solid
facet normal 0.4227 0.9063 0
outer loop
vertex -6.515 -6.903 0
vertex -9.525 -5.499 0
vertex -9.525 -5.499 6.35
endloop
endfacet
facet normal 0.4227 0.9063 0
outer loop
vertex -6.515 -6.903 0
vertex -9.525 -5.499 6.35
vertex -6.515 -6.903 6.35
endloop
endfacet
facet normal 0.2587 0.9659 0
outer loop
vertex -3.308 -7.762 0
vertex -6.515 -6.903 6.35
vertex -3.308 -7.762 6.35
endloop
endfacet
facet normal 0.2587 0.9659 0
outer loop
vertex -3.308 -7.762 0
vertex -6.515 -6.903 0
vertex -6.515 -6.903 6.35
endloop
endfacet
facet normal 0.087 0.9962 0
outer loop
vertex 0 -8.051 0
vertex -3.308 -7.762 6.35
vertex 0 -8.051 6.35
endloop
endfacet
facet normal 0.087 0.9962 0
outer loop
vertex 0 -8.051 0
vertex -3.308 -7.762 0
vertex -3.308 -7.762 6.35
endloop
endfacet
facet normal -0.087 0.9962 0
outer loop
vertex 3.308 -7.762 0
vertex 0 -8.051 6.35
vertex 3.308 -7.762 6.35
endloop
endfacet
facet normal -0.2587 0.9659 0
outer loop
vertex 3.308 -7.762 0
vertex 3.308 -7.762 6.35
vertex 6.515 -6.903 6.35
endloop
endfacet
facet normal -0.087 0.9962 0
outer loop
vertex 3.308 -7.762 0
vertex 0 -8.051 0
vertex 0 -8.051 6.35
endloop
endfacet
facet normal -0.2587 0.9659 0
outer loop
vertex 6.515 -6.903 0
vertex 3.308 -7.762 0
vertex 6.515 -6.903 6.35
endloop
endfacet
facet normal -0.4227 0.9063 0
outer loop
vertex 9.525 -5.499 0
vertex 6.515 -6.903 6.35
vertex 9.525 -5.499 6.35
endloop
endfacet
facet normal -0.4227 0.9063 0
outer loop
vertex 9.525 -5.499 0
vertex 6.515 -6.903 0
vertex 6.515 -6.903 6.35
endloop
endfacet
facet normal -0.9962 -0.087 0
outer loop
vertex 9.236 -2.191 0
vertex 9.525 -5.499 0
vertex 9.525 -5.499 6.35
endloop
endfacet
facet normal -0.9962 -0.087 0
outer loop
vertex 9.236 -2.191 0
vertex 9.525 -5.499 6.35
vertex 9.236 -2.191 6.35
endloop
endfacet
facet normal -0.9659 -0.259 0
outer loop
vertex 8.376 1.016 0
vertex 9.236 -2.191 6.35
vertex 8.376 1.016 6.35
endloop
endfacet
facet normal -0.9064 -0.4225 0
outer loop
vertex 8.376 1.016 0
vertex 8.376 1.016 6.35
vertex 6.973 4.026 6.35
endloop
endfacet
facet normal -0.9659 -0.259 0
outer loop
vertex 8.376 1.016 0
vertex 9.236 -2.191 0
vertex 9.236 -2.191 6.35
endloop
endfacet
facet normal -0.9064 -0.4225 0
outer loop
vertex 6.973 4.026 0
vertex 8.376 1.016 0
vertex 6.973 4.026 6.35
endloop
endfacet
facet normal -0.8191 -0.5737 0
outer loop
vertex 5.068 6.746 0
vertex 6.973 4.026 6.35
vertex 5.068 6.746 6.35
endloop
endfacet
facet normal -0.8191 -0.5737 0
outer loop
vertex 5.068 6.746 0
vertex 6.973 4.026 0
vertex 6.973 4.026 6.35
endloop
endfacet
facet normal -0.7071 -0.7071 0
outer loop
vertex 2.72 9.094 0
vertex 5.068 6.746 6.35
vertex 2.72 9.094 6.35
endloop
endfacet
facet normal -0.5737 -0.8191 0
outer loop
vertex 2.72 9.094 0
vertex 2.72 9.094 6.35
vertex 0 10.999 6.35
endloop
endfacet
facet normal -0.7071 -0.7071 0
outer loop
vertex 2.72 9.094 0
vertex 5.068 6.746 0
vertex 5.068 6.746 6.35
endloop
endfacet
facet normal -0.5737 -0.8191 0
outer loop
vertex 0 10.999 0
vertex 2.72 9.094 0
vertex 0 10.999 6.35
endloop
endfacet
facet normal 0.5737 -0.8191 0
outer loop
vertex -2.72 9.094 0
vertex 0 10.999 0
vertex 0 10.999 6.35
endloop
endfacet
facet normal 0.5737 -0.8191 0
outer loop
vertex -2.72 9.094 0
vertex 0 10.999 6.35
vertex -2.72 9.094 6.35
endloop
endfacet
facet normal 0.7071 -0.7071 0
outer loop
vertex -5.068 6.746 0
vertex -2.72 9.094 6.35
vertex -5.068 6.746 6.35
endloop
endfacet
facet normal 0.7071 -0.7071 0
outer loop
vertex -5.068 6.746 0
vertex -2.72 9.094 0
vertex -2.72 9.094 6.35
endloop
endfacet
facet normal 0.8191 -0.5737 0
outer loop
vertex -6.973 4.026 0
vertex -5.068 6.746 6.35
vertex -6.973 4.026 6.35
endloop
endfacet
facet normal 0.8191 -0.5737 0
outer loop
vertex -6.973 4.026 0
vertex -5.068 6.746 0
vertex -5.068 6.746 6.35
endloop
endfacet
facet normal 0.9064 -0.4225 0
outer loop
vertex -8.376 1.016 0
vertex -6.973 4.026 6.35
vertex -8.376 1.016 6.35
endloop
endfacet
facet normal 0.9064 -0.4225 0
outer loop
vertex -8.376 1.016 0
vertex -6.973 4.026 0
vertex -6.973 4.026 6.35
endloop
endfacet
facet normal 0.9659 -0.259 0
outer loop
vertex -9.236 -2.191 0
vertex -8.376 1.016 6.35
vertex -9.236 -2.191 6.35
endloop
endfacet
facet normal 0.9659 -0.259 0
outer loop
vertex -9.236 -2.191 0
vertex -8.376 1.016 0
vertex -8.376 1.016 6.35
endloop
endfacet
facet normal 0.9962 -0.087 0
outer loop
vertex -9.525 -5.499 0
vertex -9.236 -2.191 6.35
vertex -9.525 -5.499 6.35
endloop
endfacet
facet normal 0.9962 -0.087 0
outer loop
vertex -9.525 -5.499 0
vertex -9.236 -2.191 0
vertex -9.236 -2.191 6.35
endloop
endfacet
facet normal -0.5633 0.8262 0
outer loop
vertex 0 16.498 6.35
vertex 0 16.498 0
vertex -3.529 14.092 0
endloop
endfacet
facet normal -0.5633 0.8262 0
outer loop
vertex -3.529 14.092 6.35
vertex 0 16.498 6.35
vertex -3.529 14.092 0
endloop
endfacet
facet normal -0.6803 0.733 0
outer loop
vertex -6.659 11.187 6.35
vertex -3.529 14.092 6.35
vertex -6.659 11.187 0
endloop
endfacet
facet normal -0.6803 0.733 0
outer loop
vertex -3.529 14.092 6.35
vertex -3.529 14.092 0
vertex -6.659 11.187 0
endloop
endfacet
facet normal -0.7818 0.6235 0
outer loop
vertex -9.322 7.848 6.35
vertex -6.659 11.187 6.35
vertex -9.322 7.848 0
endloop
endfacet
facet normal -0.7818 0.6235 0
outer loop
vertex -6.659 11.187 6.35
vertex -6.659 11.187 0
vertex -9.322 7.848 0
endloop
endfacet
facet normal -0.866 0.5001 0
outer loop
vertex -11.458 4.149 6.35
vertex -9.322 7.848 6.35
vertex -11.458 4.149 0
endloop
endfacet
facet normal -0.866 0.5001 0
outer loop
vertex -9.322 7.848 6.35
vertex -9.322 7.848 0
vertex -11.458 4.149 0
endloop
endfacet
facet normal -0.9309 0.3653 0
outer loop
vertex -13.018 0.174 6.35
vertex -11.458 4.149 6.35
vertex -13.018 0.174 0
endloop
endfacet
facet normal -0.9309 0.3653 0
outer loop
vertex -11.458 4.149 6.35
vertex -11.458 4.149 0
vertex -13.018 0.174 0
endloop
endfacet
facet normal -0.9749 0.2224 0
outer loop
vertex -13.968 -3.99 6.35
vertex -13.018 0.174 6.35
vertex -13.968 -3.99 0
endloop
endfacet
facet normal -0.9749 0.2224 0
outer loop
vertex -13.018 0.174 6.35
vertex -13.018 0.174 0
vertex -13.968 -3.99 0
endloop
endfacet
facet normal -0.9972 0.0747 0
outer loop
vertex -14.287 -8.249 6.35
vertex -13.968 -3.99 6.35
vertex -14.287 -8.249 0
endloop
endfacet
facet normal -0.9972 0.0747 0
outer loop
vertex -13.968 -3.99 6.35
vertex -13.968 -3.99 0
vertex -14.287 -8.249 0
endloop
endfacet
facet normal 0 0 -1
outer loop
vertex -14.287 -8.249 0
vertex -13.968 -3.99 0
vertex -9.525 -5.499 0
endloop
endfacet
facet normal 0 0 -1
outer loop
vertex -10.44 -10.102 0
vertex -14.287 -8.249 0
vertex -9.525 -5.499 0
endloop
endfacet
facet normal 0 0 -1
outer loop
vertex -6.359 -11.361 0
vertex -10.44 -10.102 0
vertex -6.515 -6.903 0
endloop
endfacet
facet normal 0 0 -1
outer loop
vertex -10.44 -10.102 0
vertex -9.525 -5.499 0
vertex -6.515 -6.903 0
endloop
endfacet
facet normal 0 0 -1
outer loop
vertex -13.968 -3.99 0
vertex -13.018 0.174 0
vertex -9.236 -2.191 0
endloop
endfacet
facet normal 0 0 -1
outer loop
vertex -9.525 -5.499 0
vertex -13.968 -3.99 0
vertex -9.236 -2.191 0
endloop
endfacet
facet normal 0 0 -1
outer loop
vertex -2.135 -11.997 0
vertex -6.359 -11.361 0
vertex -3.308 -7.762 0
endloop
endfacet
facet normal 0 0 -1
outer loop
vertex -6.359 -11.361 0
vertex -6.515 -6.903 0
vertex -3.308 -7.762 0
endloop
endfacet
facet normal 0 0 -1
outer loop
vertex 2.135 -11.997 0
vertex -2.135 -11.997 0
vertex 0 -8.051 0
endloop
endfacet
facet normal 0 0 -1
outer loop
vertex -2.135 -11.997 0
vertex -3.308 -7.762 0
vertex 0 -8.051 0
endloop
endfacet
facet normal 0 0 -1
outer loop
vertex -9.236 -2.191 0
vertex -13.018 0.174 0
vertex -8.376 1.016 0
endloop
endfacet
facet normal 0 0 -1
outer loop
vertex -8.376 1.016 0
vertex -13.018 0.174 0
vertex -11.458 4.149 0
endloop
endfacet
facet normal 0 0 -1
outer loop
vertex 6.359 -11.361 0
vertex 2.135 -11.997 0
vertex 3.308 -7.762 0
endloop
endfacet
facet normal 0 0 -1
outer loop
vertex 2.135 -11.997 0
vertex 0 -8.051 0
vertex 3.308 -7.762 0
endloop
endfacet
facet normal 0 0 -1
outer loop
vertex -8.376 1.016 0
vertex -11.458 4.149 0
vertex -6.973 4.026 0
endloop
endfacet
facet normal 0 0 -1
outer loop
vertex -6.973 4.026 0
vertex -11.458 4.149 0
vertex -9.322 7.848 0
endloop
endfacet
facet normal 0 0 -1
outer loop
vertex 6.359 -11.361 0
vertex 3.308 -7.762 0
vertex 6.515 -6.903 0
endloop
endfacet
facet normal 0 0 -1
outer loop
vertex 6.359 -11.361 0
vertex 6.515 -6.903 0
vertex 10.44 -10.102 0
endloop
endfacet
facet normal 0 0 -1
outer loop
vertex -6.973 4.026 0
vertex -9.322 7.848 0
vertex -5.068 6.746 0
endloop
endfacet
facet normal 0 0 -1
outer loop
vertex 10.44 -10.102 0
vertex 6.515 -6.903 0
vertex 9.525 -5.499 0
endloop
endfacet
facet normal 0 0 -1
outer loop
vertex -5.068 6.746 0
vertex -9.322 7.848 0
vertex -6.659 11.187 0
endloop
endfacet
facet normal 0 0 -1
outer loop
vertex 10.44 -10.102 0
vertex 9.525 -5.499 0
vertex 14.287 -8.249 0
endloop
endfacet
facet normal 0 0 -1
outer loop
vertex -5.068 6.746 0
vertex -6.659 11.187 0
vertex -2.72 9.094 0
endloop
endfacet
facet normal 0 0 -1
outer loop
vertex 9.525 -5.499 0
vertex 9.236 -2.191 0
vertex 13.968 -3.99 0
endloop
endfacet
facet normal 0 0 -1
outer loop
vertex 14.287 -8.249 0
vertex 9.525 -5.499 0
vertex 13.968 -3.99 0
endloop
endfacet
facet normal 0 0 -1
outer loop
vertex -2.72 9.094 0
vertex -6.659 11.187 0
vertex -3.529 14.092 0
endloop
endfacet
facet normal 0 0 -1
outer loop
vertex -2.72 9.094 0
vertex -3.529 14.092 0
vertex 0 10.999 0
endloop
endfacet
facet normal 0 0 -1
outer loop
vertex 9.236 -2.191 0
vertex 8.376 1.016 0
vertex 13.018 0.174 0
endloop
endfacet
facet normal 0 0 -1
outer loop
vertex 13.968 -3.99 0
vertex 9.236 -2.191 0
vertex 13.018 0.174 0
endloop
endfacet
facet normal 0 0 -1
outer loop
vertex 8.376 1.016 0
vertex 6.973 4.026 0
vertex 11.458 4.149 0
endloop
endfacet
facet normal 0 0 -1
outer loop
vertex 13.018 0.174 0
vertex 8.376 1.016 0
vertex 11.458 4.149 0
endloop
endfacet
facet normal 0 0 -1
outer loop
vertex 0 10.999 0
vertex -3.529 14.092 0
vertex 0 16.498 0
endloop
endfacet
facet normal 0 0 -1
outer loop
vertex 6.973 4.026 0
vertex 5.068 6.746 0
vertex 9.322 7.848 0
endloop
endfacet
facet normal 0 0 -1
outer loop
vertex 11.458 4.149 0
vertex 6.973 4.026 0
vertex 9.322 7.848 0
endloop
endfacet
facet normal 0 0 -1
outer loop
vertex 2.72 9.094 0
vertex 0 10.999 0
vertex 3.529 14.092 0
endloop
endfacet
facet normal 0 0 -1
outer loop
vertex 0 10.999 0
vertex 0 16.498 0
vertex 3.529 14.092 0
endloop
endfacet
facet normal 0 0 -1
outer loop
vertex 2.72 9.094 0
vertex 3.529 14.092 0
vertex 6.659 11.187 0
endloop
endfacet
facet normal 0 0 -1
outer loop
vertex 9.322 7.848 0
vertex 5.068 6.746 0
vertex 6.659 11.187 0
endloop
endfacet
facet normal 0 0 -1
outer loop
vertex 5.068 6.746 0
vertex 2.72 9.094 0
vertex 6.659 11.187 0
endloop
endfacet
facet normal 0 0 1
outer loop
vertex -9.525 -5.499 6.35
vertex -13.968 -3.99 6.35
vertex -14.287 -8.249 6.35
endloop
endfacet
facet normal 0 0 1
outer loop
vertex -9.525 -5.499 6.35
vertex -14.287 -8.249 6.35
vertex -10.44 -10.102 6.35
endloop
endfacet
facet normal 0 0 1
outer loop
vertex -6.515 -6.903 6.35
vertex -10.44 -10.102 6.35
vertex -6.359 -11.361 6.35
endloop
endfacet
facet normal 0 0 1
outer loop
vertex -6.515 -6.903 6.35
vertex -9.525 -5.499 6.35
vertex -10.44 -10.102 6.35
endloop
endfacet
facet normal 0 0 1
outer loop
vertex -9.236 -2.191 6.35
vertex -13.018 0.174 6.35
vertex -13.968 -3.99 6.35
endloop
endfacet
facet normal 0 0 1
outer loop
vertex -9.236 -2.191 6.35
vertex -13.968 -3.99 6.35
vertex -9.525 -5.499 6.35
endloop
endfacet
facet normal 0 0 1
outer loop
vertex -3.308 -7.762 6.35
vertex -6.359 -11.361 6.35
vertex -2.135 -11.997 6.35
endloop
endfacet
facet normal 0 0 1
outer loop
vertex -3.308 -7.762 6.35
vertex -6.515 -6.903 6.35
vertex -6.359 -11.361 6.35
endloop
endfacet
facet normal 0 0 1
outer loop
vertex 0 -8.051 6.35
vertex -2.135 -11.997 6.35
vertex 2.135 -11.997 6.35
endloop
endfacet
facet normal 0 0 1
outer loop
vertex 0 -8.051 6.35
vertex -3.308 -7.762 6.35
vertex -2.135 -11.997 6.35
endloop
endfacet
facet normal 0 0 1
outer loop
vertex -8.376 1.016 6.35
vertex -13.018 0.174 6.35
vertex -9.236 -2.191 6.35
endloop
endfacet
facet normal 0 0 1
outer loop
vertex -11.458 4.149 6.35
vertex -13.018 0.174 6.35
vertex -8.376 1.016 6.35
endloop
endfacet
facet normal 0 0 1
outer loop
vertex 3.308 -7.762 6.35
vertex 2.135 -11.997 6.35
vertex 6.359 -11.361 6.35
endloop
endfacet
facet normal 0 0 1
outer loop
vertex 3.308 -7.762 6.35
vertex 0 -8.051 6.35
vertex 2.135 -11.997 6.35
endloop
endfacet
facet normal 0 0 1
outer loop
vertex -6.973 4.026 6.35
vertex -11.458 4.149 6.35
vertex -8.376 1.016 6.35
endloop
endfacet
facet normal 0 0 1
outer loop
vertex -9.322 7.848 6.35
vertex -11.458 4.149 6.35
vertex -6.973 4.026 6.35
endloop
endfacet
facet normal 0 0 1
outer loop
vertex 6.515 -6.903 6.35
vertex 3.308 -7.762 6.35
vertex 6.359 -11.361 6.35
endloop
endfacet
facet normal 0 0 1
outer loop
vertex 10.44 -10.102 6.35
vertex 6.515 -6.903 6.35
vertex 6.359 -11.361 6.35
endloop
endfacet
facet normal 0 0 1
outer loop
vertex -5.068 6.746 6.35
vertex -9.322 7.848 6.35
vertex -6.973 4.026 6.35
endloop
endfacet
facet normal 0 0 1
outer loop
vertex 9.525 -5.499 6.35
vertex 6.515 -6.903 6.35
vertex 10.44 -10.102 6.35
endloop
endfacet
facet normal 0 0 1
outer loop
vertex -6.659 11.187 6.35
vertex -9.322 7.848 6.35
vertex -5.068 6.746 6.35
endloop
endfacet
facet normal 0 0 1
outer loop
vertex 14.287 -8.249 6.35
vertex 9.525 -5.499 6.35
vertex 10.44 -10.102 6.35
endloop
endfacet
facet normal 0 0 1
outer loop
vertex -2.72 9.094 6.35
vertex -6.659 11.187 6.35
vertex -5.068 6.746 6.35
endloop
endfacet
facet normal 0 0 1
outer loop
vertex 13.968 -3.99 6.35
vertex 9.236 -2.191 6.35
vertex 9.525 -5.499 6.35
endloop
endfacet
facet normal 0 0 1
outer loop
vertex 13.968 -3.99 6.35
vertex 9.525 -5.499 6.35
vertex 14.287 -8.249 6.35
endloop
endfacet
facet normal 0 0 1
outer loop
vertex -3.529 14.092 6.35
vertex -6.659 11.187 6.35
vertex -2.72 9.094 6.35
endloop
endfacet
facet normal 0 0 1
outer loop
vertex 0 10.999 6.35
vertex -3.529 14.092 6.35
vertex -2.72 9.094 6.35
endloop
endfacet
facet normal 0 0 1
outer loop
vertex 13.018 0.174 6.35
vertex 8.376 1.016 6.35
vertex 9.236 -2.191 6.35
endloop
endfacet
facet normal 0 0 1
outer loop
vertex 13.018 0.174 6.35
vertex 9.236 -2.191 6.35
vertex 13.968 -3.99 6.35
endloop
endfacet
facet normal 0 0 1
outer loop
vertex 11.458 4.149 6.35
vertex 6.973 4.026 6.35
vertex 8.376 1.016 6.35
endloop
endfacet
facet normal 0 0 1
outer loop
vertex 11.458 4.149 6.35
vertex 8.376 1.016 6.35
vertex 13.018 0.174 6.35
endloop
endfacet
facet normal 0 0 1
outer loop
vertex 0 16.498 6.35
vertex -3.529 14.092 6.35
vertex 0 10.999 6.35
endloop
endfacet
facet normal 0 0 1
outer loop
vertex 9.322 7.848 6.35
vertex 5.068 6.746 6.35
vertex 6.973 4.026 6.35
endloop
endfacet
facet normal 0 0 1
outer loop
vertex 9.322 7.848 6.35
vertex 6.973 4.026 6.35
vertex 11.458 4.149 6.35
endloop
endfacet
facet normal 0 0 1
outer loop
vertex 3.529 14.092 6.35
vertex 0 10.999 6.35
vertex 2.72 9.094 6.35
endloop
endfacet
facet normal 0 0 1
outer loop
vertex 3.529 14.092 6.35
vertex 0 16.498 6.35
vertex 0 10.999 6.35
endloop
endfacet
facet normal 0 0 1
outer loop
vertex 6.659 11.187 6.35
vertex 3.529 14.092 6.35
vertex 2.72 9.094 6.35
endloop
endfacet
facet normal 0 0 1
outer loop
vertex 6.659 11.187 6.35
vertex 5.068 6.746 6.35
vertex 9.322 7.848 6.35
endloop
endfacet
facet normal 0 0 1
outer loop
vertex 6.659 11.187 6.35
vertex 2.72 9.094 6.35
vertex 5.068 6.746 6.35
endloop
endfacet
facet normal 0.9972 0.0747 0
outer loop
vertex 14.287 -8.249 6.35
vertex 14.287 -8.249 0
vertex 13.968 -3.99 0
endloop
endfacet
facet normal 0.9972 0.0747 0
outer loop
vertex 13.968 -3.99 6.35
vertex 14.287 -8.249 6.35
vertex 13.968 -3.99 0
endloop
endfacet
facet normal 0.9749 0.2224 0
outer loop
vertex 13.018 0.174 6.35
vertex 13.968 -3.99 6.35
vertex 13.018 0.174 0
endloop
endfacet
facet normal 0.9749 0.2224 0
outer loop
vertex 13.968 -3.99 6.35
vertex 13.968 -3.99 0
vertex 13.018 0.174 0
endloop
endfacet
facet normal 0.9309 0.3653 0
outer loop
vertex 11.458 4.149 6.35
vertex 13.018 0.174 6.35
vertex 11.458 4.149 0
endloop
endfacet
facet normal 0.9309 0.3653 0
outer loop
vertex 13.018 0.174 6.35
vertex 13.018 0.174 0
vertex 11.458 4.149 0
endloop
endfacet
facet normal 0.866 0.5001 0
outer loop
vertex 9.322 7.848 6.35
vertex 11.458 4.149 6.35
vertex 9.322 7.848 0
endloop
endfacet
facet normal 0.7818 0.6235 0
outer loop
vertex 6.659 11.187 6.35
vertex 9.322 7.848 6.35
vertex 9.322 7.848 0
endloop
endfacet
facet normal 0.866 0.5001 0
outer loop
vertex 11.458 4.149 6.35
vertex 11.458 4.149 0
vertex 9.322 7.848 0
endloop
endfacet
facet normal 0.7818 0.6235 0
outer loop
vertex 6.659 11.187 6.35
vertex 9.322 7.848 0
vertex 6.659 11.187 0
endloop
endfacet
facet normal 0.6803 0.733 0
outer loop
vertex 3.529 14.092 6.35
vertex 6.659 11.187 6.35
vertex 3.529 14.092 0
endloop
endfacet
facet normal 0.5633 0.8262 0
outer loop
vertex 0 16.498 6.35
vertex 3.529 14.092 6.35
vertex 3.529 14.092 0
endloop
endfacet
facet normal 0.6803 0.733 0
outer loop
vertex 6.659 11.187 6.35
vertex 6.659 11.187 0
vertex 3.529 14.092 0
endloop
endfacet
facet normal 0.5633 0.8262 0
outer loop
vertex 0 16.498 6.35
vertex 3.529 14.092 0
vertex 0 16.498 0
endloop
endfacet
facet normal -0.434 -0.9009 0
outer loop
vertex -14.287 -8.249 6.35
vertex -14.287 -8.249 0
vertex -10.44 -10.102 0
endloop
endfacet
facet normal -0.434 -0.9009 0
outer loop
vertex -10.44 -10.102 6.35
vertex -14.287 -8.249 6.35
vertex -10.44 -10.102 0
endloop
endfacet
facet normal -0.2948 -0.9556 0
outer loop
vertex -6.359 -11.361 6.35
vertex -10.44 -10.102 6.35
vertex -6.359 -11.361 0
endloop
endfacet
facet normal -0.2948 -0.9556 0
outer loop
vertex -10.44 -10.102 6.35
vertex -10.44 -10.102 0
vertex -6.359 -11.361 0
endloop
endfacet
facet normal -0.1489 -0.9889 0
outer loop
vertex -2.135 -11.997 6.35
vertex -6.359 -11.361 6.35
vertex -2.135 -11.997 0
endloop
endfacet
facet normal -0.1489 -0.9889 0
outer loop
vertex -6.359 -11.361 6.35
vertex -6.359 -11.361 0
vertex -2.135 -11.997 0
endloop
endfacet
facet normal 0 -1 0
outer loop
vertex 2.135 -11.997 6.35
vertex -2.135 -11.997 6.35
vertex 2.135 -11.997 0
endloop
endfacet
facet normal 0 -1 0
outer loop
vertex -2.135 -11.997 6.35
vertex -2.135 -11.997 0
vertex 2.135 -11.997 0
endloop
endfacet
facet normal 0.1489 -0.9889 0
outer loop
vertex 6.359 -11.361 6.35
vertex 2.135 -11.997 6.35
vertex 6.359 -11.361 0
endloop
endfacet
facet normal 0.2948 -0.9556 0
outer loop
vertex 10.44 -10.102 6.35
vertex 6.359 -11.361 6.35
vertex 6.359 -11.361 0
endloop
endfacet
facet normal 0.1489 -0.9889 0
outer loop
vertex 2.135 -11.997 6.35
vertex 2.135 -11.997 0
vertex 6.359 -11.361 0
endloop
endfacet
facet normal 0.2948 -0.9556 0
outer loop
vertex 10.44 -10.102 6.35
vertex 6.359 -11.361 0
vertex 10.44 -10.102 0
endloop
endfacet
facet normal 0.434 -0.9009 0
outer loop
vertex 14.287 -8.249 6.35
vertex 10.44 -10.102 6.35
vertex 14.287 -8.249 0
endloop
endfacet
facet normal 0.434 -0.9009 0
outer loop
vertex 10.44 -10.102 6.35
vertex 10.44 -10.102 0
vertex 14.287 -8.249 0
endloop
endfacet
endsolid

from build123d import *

# Parameters (mm, degrees)
F2_DEPTH = 6.35
F3_DEPTH = 6.35


# Not quite as in the source:
# - a feature of the source that left no trace in its solid (it failed there, or was rolled back) is left out


with BuildPart() as f2:
    # F1 (on Top) → F2 (new body)
    with BuildSketch(Plane.XY):
        with BuildLine():
            ThreePointArc((14.2875, -8.248891971), (10.4591759131, 6.038608029), (0, 16.4977839421))
            ThreePointArc((0, 16.4977839421), (-10.4591759131, 6.038608029), (-14.2875, -8.248891971))
            ThreePointArc((-14.2875, -8.248891971), (0, -12.0772160579), (14.2875, -8.248891971))
        make_face()
    extrude(amount=F2_DEPTH)

    # F0 (on Top) → F3 (cut, through all)
    with BuildSketch(Plane.XY):
        with BuildLine():
            ThreePointArc((9.525, -5.499261314), (6.9727839421, 4.025738686), (0, 10.9985226281))
            ThreePointArc((0, 10.9985226281), (-6.9727839421, 4.025738686), (-9.525, -5.499261314))
            ThreePointArc((-9.525, -5.499261314), (0, -8.0514773719), (9.525, -5.499261314))
        make_face()
    extrude(amount=F3_DEPTH, mode=Mode.SUBTRACT)


solid = f2.part
